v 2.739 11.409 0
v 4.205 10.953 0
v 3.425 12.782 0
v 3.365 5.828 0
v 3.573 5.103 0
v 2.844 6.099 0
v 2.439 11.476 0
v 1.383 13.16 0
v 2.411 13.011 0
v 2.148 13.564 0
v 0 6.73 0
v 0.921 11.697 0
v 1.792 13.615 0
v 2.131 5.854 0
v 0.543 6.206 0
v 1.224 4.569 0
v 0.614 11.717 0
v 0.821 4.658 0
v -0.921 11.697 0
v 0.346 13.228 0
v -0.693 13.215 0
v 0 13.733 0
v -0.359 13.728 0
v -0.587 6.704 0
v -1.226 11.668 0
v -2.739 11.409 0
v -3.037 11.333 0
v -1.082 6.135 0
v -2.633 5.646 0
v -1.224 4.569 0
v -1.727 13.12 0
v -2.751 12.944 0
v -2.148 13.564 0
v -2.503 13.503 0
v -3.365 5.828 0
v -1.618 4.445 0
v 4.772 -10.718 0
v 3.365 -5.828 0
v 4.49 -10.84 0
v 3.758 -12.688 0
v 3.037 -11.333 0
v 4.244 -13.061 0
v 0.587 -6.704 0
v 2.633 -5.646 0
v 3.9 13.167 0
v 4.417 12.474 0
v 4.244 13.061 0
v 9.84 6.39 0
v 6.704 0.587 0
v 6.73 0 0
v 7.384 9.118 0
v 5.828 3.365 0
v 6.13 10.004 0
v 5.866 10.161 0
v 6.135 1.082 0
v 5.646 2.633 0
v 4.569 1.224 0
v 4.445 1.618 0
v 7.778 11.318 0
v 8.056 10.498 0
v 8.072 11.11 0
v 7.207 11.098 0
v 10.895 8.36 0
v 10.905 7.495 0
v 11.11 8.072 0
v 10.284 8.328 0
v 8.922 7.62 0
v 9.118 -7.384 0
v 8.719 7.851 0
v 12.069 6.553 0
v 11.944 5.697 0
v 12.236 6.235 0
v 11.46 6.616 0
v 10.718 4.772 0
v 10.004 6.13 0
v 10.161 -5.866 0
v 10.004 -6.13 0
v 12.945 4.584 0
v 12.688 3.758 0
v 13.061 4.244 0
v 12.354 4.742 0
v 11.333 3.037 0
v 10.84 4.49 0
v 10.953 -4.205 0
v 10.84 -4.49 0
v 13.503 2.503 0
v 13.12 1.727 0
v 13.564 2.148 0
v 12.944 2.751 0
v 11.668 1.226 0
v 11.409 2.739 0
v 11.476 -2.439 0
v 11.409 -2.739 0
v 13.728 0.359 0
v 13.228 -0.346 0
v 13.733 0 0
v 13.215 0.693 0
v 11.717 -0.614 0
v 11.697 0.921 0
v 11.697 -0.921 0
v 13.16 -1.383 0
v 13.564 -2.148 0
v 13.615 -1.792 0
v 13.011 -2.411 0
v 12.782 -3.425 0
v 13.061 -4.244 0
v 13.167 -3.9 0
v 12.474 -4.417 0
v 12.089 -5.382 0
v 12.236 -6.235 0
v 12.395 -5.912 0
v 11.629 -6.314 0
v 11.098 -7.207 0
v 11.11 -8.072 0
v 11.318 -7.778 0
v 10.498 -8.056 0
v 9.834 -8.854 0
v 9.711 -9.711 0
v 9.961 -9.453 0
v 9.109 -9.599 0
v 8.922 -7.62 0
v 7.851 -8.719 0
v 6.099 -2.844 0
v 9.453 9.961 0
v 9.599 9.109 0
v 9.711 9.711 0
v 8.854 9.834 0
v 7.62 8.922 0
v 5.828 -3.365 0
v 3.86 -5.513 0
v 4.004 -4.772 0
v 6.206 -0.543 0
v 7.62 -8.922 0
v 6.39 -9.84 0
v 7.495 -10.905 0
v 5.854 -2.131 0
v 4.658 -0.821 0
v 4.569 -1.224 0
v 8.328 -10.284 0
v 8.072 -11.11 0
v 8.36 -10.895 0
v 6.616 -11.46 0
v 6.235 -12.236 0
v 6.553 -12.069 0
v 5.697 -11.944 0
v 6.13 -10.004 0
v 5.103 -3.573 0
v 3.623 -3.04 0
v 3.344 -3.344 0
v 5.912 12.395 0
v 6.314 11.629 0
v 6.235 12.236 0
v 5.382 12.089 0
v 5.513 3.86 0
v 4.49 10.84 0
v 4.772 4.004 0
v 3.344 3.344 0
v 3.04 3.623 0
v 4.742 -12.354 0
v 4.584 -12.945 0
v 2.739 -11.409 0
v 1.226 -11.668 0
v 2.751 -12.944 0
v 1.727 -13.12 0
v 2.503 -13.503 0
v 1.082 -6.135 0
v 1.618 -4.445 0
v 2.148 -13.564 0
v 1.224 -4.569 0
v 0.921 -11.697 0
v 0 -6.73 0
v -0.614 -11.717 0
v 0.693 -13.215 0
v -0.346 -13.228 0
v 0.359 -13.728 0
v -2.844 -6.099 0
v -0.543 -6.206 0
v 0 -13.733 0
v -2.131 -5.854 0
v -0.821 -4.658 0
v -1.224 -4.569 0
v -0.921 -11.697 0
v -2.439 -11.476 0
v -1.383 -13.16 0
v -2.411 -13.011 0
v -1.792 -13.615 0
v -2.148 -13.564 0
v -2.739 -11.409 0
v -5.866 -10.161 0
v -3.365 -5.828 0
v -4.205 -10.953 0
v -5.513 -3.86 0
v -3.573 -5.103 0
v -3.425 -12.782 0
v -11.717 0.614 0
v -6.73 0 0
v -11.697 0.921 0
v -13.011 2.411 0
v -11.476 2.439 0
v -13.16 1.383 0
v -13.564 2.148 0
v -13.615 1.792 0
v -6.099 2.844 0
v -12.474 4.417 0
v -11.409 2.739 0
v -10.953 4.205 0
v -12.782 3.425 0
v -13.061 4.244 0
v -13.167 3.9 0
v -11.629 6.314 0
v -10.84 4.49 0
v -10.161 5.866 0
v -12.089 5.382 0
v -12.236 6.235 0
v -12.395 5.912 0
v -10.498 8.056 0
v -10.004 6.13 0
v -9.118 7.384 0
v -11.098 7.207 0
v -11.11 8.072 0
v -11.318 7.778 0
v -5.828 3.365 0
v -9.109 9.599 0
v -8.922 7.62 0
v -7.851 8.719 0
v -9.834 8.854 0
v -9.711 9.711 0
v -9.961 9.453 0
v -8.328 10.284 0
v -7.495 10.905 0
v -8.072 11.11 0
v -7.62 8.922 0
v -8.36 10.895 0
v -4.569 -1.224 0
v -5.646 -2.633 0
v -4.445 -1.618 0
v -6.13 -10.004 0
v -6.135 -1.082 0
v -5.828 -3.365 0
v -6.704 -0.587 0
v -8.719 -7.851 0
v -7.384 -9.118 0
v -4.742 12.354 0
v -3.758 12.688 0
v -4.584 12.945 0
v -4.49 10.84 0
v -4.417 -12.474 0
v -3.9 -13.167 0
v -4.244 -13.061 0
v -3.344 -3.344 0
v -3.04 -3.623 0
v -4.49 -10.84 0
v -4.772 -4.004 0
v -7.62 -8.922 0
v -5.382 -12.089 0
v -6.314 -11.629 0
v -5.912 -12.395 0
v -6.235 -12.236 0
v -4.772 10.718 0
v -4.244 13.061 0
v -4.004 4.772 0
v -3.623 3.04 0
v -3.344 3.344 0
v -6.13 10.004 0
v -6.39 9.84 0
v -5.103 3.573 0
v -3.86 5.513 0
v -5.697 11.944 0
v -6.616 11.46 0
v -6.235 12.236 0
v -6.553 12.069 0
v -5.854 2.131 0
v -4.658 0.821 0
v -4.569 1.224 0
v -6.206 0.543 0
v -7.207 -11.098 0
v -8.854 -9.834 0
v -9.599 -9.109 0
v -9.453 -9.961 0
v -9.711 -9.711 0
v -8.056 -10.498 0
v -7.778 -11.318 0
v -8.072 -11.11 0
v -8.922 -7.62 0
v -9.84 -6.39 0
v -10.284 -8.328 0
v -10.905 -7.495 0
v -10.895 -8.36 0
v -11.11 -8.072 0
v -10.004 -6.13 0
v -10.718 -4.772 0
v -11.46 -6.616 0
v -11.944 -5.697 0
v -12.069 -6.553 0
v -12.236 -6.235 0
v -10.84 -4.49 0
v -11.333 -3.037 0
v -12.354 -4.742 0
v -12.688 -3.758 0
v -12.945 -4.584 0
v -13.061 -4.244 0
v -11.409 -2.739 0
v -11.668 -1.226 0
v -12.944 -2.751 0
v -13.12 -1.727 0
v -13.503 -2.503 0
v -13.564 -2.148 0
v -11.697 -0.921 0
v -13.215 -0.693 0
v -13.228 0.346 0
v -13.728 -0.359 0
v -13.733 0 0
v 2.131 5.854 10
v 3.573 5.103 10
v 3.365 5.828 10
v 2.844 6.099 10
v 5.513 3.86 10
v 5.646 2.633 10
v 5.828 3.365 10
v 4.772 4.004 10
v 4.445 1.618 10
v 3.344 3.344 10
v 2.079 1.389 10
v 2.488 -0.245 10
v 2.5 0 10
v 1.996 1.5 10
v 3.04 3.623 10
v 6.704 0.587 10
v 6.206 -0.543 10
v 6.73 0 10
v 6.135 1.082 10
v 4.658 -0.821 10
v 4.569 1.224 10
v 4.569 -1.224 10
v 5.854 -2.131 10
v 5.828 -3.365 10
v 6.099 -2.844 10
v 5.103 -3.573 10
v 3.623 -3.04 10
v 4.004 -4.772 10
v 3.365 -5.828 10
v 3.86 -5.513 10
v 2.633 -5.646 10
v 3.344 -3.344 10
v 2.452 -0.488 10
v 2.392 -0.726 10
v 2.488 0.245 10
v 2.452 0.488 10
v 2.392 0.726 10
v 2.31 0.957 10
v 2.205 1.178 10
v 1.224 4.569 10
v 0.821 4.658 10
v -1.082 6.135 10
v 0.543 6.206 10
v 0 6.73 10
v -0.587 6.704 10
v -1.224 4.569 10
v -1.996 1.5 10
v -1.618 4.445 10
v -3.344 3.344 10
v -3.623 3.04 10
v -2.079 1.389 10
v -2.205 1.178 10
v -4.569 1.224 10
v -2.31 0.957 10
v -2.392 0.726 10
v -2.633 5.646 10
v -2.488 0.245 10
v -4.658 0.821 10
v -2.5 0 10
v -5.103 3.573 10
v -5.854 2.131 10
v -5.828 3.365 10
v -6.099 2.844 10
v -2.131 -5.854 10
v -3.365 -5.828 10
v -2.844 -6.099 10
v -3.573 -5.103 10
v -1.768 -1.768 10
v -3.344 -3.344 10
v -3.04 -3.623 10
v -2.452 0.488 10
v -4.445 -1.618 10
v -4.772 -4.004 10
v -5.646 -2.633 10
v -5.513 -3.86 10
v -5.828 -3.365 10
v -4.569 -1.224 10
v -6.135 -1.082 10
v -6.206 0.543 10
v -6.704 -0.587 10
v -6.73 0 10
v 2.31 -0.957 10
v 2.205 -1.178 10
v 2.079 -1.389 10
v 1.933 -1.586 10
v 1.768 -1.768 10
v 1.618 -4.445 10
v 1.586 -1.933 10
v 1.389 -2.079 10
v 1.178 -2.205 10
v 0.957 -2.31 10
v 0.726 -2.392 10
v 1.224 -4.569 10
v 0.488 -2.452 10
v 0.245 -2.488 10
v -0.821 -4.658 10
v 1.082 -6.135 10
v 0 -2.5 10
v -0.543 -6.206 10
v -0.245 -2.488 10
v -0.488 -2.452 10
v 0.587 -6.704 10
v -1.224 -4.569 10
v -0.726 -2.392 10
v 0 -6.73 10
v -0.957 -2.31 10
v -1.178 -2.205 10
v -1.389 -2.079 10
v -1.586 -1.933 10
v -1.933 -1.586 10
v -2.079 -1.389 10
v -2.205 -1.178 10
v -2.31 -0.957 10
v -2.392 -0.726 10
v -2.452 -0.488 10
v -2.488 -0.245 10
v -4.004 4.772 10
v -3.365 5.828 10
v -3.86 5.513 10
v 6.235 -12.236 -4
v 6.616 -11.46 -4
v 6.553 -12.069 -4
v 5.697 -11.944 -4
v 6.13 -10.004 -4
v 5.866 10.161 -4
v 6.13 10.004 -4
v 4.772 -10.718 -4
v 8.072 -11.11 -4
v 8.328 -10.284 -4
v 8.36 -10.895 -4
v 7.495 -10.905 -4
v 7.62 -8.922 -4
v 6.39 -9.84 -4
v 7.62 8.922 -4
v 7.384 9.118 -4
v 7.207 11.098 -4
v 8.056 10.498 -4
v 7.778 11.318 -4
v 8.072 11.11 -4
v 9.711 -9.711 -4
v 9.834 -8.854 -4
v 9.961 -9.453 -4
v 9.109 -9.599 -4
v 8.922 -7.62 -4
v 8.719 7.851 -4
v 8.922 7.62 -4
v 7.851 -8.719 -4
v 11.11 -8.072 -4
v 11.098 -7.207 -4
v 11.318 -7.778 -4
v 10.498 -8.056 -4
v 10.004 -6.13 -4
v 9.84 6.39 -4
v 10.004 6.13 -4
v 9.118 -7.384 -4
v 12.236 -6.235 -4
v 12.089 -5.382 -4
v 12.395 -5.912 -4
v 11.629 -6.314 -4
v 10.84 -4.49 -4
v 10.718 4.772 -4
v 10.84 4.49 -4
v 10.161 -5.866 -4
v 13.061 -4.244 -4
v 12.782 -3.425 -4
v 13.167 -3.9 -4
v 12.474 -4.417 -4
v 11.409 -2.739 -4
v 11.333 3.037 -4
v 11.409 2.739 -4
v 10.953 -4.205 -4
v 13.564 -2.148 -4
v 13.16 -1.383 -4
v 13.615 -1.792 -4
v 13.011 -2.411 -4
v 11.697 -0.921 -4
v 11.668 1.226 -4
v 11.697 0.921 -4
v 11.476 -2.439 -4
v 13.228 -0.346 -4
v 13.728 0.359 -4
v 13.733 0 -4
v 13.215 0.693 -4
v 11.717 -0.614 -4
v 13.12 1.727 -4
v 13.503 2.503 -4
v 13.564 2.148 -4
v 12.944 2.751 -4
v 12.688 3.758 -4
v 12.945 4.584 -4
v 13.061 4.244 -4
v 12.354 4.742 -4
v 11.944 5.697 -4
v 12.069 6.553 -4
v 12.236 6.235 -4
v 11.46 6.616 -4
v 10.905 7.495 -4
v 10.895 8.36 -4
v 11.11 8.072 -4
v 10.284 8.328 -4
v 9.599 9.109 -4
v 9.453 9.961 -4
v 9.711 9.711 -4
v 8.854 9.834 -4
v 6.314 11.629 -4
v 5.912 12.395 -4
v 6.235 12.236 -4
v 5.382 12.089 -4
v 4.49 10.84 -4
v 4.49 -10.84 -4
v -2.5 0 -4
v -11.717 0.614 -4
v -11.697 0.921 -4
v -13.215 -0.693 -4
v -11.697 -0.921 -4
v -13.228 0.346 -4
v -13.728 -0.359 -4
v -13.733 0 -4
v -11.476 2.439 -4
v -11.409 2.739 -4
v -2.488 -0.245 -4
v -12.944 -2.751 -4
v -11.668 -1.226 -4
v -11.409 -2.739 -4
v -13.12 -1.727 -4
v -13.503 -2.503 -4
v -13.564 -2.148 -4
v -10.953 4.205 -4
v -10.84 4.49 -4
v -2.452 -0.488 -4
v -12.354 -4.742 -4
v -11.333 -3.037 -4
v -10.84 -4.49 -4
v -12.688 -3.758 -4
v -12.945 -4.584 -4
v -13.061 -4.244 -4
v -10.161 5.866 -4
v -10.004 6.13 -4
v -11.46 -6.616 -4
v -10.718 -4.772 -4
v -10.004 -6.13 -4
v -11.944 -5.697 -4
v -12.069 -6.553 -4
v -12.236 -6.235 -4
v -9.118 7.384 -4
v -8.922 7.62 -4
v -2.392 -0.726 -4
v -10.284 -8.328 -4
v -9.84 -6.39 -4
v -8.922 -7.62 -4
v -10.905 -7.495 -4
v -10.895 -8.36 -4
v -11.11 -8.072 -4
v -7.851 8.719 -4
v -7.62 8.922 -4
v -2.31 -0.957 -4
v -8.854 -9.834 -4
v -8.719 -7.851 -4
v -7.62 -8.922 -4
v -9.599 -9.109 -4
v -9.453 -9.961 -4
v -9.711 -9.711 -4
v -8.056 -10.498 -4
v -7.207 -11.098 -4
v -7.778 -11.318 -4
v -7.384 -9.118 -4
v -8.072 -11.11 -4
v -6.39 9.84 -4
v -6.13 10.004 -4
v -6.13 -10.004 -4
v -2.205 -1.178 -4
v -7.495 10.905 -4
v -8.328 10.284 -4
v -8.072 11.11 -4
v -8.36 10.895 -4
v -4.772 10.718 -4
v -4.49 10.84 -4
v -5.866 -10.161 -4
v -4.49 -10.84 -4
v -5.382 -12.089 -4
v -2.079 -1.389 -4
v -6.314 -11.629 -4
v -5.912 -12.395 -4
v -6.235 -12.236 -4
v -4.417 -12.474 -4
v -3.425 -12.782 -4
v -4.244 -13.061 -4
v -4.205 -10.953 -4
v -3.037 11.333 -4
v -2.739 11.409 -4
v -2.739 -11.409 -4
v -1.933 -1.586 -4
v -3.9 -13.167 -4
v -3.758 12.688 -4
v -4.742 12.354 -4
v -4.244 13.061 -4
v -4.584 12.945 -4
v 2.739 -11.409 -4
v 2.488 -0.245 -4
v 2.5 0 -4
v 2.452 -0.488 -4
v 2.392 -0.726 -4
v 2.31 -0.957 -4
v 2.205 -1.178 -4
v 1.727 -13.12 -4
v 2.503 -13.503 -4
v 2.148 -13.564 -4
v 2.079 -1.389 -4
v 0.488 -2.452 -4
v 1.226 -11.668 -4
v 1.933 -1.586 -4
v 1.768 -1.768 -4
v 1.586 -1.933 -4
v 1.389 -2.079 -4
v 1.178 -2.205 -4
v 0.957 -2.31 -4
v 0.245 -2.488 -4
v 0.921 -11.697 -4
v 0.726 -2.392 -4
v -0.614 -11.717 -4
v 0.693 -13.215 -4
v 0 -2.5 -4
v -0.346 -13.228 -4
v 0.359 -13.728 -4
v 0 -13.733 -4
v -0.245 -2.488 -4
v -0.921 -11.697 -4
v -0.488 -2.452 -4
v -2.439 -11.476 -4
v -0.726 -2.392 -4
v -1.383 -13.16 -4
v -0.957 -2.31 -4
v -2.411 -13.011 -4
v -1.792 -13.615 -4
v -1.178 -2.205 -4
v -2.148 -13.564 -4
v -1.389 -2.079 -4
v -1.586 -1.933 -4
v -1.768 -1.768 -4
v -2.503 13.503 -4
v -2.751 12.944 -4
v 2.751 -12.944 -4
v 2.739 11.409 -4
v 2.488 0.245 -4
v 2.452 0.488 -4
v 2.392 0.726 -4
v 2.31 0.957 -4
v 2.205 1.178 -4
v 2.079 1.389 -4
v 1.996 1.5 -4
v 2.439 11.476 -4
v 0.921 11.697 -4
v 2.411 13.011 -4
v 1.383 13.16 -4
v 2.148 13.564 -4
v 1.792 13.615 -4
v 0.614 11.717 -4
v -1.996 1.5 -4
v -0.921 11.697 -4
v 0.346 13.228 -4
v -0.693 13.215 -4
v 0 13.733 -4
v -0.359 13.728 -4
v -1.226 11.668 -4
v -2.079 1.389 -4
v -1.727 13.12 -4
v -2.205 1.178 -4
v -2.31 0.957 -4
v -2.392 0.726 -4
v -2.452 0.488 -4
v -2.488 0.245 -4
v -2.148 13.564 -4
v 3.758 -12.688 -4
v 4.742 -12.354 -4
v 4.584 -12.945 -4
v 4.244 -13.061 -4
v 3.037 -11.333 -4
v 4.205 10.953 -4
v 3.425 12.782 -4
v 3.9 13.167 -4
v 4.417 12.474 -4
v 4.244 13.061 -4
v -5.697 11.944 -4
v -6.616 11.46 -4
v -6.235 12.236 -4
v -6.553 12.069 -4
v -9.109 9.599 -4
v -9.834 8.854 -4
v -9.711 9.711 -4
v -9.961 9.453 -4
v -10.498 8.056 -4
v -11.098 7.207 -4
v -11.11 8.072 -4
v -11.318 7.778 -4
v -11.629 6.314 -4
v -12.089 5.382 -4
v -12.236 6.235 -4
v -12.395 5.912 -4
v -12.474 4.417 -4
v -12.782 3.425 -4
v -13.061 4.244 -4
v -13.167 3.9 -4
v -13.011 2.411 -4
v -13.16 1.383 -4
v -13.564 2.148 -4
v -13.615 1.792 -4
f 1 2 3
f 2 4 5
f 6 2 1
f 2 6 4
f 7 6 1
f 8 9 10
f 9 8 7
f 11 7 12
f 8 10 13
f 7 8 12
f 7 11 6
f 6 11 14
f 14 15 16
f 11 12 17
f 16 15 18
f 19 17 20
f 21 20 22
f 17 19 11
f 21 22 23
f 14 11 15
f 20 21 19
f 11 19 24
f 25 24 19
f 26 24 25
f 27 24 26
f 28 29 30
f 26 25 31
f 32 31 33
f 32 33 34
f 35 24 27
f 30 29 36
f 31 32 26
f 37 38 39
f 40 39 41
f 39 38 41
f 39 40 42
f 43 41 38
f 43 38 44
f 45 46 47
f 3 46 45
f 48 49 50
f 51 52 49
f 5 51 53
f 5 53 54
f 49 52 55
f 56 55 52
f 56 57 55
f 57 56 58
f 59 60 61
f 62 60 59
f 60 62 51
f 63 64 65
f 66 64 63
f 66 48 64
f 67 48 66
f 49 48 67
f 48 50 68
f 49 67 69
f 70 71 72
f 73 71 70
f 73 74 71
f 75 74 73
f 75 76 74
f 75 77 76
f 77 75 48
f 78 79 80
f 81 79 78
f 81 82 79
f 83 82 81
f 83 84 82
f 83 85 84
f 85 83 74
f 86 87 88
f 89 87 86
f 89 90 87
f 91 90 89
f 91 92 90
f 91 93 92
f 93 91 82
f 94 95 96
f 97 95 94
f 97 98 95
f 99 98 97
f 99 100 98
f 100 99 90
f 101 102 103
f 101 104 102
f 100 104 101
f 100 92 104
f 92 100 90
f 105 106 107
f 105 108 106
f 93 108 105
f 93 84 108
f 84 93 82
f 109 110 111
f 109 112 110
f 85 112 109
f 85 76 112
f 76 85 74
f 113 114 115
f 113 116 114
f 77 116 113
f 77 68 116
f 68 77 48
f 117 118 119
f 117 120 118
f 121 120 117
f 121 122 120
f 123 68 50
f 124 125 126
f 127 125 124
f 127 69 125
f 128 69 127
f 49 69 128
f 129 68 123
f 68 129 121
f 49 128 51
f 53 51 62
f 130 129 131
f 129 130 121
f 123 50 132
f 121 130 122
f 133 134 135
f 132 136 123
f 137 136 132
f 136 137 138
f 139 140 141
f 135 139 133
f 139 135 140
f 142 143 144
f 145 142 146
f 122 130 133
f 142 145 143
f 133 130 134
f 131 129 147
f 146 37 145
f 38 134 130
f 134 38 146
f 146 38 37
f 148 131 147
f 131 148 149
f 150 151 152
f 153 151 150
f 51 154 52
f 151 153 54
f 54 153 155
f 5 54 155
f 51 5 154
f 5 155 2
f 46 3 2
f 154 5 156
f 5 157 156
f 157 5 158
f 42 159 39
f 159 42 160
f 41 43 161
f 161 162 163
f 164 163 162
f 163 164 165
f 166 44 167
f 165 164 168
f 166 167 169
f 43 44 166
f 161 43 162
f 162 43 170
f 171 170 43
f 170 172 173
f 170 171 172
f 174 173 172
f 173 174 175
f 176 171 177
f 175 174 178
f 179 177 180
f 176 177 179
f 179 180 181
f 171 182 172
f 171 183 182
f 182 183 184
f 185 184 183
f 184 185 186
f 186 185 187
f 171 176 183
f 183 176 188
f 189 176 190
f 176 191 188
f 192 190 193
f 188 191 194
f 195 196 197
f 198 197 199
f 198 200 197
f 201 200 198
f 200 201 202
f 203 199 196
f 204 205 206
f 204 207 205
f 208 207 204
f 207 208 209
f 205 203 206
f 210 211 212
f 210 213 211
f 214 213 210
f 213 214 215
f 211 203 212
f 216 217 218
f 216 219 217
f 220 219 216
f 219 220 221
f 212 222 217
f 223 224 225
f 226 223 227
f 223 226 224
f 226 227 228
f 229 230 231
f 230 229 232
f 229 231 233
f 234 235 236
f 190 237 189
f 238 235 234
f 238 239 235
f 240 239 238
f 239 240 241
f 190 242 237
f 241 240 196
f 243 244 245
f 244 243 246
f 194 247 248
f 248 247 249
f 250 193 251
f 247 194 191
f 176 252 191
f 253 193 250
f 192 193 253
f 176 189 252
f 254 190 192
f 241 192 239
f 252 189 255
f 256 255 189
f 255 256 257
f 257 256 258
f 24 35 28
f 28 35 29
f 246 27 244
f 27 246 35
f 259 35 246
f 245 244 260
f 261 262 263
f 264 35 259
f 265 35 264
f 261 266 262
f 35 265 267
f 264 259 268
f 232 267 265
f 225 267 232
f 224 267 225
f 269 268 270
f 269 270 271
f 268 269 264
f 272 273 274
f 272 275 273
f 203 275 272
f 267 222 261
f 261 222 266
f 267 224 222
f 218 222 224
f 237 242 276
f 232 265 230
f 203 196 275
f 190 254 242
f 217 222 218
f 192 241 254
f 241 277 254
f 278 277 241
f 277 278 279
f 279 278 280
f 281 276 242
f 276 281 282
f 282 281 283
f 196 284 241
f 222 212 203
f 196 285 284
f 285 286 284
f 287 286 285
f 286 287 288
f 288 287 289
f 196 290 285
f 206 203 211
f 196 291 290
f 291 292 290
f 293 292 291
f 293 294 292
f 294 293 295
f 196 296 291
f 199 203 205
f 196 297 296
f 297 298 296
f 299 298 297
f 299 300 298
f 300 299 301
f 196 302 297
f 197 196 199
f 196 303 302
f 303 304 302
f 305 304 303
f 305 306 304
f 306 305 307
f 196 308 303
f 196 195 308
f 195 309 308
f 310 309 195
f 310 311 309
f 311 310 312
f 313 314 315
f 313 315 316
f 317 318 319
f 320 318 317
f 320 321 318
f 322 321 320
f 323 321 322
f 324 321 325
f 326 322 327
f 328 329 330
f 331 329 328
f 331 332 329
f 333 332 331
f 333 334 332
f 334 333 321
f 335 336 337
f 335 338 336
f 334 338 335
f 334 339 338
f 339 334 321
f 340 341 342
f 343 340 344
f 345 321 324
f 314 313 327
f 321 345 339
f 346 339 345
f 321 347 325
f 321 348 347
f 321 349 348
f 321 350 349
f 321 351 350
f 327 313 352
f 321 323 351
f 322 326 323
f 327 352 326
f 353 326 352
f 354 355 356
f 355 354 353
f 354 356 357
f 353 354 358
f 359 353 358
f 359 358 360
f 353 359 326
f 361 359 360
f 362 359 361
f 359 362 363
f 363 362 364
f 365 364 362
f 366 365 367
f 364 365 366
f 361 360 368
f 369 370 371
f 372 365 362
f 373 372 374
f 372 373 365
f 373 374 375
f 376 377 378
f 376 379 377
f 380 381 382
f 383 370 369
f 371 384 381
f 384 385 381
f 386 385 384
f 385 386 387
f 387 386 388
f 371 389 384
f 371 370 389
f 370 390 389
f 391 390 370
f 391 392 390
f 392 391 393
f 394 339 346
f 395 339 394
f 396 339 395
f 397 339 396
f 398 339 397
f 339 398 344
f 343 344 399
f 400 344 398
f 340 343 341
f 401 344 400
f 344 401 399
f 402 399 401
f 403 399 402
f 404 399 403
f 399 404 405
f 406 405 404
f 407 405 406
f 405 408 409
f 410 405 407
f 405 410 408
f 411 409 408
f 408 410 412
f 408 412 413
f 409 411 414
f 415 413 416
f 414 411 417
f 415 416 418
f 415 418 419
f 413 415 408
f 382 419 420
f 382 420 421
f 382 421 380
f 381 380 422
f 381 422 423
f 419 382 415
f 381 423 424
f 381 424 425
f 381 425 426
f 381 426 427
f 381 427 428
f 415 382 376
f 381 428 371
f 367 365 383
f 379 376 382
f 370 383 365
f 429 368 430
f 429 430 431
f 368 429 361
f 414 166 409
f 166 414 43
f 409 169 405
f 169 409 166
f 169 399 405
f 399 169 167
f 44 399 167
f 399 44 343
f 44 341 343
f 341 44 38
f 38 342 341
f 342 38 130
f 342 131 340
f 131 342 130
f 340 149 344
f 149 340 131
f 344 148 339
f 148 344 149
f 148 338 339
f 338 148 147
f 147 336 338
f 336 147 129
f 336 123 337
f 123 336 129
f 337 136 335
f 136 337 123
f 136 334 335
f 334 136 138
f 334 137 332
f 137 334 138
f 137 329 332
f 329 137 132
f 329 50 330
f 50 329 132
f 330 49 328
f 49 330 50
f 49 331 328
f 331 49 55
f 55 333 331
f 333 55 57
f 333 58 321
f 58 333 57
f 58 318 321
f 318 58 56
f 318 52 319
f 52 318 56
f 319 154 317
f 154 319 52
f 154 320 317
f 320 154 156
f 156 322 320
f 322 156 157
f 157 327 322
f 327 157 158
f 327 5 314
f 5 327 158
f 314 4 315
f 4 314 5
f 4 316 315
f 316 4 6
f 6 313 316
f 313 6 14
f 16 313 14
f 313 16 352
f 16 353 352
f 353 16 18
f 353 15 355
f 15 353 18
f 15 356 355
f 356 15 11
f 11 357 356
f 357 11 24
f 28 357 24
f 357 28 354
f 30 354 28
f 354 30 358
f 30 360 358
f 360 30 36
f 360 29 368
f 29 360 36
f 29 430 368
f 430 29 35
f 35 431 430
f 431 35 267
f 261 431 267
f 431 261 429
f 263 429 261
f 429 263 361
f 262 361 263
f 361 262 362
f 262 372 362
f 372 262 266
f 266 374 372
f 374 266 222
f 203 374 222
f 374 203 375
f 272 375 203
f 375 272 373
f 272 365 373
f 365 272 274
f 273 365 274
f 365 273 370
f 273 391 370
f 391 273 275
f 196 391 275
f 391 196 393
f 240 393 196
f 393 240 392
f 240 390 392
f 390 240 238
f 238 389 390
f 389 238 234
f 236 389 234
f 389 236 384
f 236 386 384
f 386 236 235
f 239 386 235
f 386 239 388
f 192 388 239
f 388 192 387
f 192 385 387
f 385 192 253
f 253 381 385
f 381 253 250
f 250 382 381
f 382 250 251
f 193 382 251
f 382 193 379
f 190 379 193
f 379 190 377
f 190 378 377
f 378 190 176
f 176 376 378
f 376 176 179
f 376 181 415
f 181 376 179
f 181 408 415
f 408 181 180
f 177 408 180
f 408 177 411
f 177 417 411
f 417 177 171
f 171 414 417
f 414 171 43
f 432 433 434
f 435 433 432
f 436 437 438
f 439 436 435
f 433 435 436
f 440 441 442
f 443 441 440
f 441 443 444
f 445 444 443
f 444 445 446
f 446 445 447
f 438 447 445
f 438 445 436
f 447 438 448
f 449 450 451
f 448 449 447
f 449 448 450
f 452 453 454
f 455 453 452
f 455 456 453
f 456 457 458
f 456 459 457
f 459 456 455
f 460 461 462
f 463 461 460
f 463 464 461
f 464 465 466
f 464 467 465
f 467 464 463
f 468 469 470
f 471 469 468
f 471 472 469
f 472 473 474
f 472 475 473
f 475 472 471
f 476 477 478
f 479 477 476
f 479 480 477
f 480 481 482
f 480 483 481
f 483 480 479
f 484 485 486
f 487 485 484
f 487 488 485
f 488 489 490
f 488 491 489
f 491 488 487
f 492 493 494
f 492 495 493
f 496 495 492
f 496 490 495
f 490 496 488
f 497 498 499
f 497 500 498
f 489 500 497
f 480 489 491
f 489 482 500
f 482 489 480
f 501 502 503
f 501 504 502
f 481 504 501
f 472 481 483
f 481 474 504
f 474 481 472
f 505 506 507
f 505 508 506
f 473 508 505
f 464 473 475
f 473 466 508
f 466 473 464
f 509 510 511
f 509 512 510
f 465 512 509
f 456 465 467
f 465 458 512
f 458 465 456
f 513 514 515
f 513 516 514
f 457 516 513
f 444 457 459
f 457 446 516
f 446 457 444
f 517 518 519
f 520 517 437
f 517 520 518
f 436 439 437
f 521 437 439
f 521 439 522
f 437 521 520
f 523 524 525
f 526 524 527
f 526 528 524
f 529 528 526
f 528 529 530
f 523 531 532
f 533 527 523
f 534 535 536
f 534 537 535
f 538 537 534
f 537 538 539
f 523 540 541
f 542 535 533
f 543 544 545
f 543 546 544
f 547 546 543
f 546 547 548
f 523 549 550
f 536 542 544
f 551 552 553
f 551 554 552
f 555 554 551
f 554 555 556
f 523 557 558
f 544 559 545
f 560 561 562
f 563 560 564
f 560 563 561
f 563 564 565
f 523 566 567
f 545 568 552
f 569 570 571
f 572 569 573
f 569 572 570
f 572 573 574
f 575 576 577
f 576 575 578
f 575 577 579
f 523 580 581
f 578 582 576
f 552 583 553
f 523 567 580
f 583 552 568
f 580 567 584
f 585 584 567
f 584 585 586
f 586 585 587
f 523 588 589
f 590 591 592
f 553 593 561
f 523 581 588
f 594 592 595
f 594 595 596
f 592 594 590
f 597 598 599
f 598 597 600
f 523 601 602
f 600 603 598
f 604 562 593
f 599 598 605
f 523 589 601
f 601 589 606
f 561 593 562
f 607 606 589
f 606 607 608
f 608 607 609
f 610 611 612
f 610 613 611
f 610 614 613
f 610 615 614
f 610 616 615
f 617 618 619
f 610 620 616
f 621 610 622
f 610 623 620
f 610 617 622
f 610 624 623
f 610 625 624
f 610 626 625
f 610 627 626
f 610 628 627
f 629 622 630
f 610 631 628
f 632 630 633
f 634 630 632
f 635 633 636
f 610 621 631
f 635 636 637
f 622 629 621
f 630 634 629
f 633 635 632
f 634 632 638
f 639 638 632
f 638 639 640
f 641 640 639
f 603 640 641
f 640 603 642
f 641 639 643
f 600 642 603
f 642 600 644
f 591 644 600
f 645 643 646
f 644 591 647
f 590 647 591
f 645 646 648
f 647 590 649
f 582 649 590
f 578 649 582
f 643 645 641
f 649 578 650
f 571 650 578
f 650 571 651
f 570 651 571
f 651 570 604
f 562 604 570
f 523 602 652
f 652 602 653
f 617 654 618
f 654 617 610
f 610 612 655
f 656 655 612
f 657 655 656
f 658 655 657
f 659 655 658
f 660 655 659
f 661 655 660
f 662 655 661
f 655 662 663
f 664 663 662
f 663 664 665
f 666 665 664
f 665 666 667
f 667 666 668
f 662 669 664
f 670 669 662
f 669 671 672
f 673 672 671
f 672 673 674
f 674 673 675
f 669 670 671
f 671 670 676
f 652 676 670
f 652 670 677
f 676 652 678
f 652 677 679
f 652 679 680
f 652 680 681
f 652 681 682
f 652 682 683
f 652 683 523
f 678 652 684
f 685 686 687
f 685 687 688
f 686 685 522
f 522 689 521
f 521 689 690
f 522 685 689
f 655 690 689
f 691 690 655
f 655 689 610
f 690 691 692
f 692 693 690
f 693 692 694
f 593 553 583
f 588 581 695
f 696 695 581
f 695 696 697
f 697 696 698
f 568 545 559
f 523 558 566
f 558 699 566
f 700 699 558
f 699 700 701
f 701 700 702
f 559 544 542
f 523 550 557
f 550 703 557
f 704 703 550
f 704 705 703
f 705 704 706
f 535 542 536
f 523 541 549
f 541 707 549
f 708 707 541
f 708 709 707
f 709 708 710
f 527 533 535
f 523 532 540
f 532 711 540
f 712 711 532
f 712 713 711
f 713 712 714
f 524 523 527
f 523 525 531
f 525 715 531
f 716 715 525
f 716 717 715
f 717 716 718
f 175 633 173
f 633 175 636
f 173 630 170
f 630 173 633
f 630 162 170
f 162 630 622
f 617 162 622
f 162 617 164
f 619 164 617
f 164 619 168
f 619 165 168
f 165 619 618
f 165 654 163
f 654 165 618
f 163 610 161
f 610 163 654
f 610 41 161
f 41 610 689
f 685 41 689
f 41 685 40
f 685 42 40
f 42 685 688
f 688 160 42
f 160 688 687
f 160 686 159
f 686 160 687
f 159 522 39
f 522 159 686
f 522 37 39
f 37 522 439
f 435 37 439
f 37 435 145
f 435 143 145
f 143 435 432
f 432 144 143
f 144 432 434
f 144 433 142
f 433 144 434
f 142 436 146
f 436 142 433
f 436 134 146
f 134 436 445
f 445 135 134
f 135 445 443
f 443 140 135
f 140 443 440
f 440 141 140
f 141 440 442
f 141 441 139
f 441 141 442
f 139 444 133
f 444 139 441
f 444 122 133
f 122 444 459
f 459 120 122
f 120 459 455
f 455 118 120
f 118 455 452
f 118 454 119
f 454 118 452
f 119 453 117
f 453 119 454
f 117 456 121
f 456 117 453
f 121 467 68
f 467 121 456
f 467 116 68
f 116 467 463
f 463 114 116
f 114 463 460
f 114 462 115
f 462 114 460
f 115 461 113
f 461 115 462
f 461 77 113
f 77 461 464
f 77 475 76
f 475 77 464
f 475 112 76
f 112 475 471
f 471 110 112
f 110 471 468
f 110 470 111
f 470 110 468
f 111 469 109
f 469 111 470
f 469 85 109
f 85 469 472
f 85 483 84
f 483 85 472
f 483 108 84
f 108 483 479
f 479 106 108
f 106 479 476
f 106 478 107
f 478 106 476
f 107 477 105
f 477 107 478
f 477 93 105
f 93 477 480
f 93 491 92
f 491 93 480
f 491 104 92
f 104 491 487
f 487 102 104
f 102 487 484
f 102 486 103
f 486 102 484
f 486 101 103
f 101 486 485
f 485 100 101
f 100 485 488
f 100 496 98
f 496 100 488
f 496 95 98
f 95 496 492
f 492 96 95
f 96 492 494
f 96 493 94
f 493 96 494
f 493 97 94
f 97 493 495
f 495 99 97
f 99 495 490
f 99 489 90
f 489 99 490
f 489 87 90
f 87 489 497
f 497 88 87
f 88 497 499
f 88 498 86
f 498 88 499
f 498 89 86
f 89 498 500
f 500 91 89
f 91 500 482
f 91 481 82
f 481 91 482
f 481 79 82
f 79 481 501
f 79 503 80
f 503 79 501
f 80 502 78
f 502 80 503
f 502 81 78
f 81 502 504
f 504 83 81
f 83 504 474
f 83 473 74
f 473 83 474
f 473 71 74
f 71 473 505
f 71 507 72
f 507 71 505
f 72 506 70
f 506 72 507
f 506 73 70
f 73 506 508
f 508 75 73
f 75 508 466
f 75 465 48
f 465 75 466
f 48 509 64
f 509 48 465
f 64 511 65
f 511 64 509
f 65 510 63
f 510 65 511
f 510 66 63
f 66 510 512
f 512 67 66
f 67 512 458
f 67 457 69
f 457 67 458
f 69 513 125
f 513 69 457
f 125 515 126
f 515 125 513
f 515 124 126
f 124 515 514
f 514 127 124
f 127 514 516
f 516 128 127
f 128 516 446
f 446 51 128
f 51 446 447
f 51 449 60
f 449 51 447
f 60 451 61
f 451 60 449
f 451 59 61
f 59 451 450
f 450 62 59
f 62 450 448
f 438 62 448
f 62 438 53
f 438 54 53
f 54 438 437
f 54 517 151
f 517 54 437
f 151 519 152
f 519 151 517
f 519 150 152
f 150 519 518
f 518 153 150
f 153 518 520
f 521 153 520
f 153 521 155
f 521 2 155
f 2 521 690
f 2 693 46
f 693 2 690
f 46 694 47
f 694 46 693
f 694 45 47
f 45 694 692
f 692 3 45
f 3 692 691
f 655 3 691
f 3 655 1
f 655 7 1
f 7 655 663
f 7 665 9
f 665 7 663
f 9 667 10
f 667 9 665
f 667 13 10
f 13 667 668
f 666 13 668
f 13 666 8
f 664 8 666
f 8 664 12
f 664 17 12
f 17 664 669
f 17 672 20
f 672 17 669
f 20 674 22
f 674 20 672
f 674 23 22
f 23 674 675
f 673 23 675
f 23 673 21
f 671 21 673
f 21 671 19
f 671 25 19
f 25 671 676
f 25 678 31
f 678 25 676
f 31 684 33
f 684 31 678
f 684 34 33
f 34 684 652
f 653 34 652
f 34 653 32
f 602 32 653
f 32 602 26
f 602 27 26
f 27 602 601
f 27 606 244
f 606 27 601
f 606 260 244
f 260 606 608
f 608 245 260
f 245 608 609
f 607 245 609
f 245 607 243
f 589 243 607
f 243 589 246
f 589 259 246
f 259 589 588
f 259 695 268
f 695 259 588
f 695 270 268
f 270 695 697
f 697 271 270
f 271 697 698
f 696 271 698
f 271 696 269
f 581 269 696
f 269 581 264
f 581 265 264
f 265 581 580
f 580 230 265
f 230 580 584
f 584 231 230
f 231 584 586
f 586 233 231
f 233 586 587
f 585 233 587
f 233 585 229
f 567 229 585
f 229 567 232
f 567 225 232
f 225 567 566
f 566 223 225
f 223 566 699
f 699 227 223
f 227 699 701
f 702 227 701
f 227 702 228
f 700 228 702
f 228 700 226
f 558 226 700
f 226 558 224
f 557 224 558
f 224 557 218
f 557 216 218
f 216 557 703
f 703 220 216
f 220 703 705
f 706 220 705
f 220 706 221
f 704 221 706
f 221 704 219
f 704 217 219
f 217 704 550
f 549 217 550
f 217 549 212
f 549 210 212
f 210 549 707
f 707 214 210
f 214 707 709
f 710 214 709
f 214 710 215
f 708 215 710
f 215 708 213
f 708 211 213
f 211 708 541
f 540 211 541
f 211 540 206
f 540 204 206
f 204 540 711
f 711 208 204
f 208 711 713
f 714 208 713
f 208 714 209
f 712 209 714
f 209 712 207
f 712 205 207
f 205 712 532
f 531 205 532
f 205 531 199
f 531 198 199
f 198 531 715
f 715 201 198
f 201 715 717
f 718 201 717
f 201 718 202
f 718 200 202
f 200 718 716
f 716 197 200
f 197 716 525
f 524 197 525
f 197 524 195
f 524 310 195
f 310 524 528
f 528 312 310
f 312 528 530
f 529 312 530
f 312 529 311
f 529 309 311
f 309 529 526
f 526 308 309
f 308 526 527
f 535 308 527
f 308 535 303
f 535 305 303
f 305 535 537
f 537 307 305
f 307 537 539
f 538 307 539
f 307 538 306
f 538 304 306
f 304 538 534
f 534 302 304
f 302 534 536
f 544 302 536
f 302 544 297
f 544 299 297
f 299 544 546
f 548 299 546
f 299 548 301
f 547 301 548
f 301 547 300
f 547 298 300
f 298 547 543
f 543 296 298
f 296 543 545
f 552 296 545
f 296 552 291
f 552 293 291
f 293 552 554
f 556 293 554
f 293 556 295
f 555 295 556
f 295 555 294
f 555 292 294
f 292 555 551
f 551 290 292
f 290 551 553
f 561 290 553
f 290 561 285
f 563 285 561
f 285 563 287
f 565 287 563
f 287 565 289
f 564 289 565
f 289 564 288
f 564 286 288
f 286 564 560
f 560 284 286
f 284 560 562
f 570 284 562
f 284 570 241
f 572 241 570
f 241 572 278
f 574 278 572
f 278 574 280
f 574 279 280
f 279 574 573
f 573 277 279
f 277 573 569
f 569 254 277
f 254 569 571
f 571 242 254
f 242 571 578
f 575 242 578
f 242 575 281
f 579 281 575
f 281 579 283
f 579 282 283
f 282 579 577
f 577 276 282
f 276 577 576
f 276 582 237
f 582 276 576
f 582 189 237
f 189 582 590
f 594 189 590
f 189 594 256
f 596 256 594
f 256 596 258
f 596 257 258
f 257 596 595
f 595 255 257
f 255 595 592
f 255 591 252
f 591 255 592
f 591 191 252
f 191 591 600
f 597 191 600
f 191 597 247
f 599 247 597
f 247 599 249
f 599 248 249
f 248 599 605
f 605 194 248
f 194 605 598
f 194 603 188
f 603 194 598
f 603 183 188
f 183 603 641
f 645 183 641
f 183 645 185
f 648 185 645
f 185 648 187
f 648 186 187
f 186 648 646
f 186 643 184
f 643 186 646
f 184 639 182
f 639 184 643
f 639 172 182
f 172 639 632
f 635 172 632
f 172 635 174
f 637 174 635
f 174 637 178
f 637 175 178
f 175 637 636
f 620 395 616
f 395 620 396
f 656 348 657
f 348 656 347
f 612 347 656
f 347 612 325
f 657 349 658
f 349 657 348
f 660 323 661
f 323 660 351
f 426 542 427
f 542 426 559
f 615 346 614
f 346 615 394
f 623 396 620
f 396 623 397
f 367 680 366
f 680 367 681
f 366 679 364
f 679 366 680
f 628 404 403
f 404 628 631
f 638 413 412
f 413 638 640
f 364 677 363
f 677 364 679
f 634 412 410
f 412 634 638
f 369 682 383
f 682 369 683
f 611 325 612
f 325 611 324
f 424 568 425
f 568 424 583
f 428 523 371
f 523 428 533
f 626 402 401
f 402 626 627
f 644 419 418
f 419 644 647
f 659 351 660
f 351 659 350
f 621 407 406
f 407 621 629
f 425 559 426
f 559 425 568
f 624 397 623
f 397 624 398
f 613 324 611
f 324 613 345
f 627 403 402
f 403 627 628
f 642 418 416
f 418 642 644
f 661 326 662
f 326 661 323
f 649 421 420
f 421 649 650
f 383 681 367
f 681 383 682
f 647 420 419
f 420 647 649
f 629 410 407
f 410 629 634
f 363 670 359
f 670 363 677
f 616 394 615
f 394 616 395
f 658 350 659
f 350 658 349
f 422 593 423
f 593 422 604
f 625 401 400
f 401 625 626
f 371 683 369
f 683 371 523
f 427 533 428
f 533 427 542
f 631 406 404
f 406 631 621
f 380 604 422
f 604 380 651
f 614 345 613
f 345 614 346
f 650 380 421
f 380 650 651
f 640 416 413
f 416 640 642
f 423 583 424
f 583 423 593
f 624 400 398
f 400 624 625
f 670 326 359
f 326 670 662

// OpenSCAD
/* [Settings] */
ShaftDiameter = 5;
PlasticSaverRingDepth = 0;
ShaftCut = 1;

/* [Gear 1] */
Gear1Height = 4;
Gear1TeethCount = 40;
Gear1TeethSpacing = 2;
Gear1TeethDepth = 2;

/* [Gear 2] */
Gear2Height = 10;
Gear2TeethCount = 12;
Gear2TeethSpacing = 3;
Gear2TeethDepth = 2;


difference(){
  union(){
    linear_extrude(height = Gear2Height)
      gear3(Gear2TeethCount,Gear2TeethSpacing,Gear2TeethDepth);
    translate([0,0,-Gear1Height]) linear_extrude(height = Gear1Height)
      gear3(Gear1TeethCount,Gear1TeethSpacing,Gear1TeethDepth);
  }
  if(ShaftCut>0){
   difference(){
     cylinder(h=(Gear1Height+Gear2Height)*3, d=ShaftDiameter,center=true,$fn=64);
    translate([0,ShaftDiameter-ShaftCut])
       cube([ShaftDiameter+1,ShaftDiameter,
             (Gear1Height+Gear2Height)*3],center=true);
   } 
  }else{
    cylinder(h=(Gear1Height+Gear2Height)*3, d=ShaftDiameter,center=true,$fn=64);
  }
  
  if(PlasticSaverRingDepth > 0){
    translate([0,0,-PlasticSaverRingDepth])difference(){
      diameter1 = (Gear1TeethCount*Gear1TeethSpacing)/3.1415-Gear1TeethDepth-1;
      diameter2 = (Gear2TeethCount*Gear2TeethSpacing)/3.1415+Gear2TeethDepth+1;
      
      cylinder(h=5+PlasticSaverRingDepth, d=diameter1,$fn=64);
      translate([0,0,-0.1]) 
        cylinder(h=6+PlasticSaverRingDepth, d=diameter2,$fn=64);
    }
  }
}
module gear3(TeethCount, TeethSpacing, TeethDepth){
  diameter = (TeethSpacing*TeethCount)/3.1415;
  gear2(TeethCount,diameter,TeethDepth);
}
module gear2(TeethCount, Diameter, TeethDepth){
  Radius = Diameter/2;
  teethDepth = TeethDepth;
  
  totalPoints = 6*TeethCount; // 6 poits per teeth
  degPoint = 360.0/totalPoints;
  //echo (degPoint);
  points = [ 
    for (a = [0 : totalPoints]) 
      //(Radius + (((a%4 < 2 )? 0.5 : -0.5) * teethDepth )) 
      (Radius + teeth(a)*teethDepth)
        * [ sin(a*degPoint), cos(a*degPoint) ] ];
  polygon(concat(points, [[0, 0]]));
}
module gear1(){
  Radius = 10;
  teethDepth = 2;
  points = [ 
    for (a = [0 : 360]) 
      //(Radius + (((a%4 < 2 )? 0.5 : -0.5) * teethDepth )) 
      (Radius + teeth(a)*teethDepth)
        * [ sin(a), cos(a) ] ];
  polygon(concat(points, [[0, 0]]));
}

function teeth(x) = (x % 6 == 0) ? 0.5 : 
                    (x % 6 == 1) ? 0.25:
                    (x % 6 == 2) ? -0.5: 
                    (x % 6 == 3) ? -0.5:
                    (x % 6 == 4) ? 0.25: 0.5 ;
